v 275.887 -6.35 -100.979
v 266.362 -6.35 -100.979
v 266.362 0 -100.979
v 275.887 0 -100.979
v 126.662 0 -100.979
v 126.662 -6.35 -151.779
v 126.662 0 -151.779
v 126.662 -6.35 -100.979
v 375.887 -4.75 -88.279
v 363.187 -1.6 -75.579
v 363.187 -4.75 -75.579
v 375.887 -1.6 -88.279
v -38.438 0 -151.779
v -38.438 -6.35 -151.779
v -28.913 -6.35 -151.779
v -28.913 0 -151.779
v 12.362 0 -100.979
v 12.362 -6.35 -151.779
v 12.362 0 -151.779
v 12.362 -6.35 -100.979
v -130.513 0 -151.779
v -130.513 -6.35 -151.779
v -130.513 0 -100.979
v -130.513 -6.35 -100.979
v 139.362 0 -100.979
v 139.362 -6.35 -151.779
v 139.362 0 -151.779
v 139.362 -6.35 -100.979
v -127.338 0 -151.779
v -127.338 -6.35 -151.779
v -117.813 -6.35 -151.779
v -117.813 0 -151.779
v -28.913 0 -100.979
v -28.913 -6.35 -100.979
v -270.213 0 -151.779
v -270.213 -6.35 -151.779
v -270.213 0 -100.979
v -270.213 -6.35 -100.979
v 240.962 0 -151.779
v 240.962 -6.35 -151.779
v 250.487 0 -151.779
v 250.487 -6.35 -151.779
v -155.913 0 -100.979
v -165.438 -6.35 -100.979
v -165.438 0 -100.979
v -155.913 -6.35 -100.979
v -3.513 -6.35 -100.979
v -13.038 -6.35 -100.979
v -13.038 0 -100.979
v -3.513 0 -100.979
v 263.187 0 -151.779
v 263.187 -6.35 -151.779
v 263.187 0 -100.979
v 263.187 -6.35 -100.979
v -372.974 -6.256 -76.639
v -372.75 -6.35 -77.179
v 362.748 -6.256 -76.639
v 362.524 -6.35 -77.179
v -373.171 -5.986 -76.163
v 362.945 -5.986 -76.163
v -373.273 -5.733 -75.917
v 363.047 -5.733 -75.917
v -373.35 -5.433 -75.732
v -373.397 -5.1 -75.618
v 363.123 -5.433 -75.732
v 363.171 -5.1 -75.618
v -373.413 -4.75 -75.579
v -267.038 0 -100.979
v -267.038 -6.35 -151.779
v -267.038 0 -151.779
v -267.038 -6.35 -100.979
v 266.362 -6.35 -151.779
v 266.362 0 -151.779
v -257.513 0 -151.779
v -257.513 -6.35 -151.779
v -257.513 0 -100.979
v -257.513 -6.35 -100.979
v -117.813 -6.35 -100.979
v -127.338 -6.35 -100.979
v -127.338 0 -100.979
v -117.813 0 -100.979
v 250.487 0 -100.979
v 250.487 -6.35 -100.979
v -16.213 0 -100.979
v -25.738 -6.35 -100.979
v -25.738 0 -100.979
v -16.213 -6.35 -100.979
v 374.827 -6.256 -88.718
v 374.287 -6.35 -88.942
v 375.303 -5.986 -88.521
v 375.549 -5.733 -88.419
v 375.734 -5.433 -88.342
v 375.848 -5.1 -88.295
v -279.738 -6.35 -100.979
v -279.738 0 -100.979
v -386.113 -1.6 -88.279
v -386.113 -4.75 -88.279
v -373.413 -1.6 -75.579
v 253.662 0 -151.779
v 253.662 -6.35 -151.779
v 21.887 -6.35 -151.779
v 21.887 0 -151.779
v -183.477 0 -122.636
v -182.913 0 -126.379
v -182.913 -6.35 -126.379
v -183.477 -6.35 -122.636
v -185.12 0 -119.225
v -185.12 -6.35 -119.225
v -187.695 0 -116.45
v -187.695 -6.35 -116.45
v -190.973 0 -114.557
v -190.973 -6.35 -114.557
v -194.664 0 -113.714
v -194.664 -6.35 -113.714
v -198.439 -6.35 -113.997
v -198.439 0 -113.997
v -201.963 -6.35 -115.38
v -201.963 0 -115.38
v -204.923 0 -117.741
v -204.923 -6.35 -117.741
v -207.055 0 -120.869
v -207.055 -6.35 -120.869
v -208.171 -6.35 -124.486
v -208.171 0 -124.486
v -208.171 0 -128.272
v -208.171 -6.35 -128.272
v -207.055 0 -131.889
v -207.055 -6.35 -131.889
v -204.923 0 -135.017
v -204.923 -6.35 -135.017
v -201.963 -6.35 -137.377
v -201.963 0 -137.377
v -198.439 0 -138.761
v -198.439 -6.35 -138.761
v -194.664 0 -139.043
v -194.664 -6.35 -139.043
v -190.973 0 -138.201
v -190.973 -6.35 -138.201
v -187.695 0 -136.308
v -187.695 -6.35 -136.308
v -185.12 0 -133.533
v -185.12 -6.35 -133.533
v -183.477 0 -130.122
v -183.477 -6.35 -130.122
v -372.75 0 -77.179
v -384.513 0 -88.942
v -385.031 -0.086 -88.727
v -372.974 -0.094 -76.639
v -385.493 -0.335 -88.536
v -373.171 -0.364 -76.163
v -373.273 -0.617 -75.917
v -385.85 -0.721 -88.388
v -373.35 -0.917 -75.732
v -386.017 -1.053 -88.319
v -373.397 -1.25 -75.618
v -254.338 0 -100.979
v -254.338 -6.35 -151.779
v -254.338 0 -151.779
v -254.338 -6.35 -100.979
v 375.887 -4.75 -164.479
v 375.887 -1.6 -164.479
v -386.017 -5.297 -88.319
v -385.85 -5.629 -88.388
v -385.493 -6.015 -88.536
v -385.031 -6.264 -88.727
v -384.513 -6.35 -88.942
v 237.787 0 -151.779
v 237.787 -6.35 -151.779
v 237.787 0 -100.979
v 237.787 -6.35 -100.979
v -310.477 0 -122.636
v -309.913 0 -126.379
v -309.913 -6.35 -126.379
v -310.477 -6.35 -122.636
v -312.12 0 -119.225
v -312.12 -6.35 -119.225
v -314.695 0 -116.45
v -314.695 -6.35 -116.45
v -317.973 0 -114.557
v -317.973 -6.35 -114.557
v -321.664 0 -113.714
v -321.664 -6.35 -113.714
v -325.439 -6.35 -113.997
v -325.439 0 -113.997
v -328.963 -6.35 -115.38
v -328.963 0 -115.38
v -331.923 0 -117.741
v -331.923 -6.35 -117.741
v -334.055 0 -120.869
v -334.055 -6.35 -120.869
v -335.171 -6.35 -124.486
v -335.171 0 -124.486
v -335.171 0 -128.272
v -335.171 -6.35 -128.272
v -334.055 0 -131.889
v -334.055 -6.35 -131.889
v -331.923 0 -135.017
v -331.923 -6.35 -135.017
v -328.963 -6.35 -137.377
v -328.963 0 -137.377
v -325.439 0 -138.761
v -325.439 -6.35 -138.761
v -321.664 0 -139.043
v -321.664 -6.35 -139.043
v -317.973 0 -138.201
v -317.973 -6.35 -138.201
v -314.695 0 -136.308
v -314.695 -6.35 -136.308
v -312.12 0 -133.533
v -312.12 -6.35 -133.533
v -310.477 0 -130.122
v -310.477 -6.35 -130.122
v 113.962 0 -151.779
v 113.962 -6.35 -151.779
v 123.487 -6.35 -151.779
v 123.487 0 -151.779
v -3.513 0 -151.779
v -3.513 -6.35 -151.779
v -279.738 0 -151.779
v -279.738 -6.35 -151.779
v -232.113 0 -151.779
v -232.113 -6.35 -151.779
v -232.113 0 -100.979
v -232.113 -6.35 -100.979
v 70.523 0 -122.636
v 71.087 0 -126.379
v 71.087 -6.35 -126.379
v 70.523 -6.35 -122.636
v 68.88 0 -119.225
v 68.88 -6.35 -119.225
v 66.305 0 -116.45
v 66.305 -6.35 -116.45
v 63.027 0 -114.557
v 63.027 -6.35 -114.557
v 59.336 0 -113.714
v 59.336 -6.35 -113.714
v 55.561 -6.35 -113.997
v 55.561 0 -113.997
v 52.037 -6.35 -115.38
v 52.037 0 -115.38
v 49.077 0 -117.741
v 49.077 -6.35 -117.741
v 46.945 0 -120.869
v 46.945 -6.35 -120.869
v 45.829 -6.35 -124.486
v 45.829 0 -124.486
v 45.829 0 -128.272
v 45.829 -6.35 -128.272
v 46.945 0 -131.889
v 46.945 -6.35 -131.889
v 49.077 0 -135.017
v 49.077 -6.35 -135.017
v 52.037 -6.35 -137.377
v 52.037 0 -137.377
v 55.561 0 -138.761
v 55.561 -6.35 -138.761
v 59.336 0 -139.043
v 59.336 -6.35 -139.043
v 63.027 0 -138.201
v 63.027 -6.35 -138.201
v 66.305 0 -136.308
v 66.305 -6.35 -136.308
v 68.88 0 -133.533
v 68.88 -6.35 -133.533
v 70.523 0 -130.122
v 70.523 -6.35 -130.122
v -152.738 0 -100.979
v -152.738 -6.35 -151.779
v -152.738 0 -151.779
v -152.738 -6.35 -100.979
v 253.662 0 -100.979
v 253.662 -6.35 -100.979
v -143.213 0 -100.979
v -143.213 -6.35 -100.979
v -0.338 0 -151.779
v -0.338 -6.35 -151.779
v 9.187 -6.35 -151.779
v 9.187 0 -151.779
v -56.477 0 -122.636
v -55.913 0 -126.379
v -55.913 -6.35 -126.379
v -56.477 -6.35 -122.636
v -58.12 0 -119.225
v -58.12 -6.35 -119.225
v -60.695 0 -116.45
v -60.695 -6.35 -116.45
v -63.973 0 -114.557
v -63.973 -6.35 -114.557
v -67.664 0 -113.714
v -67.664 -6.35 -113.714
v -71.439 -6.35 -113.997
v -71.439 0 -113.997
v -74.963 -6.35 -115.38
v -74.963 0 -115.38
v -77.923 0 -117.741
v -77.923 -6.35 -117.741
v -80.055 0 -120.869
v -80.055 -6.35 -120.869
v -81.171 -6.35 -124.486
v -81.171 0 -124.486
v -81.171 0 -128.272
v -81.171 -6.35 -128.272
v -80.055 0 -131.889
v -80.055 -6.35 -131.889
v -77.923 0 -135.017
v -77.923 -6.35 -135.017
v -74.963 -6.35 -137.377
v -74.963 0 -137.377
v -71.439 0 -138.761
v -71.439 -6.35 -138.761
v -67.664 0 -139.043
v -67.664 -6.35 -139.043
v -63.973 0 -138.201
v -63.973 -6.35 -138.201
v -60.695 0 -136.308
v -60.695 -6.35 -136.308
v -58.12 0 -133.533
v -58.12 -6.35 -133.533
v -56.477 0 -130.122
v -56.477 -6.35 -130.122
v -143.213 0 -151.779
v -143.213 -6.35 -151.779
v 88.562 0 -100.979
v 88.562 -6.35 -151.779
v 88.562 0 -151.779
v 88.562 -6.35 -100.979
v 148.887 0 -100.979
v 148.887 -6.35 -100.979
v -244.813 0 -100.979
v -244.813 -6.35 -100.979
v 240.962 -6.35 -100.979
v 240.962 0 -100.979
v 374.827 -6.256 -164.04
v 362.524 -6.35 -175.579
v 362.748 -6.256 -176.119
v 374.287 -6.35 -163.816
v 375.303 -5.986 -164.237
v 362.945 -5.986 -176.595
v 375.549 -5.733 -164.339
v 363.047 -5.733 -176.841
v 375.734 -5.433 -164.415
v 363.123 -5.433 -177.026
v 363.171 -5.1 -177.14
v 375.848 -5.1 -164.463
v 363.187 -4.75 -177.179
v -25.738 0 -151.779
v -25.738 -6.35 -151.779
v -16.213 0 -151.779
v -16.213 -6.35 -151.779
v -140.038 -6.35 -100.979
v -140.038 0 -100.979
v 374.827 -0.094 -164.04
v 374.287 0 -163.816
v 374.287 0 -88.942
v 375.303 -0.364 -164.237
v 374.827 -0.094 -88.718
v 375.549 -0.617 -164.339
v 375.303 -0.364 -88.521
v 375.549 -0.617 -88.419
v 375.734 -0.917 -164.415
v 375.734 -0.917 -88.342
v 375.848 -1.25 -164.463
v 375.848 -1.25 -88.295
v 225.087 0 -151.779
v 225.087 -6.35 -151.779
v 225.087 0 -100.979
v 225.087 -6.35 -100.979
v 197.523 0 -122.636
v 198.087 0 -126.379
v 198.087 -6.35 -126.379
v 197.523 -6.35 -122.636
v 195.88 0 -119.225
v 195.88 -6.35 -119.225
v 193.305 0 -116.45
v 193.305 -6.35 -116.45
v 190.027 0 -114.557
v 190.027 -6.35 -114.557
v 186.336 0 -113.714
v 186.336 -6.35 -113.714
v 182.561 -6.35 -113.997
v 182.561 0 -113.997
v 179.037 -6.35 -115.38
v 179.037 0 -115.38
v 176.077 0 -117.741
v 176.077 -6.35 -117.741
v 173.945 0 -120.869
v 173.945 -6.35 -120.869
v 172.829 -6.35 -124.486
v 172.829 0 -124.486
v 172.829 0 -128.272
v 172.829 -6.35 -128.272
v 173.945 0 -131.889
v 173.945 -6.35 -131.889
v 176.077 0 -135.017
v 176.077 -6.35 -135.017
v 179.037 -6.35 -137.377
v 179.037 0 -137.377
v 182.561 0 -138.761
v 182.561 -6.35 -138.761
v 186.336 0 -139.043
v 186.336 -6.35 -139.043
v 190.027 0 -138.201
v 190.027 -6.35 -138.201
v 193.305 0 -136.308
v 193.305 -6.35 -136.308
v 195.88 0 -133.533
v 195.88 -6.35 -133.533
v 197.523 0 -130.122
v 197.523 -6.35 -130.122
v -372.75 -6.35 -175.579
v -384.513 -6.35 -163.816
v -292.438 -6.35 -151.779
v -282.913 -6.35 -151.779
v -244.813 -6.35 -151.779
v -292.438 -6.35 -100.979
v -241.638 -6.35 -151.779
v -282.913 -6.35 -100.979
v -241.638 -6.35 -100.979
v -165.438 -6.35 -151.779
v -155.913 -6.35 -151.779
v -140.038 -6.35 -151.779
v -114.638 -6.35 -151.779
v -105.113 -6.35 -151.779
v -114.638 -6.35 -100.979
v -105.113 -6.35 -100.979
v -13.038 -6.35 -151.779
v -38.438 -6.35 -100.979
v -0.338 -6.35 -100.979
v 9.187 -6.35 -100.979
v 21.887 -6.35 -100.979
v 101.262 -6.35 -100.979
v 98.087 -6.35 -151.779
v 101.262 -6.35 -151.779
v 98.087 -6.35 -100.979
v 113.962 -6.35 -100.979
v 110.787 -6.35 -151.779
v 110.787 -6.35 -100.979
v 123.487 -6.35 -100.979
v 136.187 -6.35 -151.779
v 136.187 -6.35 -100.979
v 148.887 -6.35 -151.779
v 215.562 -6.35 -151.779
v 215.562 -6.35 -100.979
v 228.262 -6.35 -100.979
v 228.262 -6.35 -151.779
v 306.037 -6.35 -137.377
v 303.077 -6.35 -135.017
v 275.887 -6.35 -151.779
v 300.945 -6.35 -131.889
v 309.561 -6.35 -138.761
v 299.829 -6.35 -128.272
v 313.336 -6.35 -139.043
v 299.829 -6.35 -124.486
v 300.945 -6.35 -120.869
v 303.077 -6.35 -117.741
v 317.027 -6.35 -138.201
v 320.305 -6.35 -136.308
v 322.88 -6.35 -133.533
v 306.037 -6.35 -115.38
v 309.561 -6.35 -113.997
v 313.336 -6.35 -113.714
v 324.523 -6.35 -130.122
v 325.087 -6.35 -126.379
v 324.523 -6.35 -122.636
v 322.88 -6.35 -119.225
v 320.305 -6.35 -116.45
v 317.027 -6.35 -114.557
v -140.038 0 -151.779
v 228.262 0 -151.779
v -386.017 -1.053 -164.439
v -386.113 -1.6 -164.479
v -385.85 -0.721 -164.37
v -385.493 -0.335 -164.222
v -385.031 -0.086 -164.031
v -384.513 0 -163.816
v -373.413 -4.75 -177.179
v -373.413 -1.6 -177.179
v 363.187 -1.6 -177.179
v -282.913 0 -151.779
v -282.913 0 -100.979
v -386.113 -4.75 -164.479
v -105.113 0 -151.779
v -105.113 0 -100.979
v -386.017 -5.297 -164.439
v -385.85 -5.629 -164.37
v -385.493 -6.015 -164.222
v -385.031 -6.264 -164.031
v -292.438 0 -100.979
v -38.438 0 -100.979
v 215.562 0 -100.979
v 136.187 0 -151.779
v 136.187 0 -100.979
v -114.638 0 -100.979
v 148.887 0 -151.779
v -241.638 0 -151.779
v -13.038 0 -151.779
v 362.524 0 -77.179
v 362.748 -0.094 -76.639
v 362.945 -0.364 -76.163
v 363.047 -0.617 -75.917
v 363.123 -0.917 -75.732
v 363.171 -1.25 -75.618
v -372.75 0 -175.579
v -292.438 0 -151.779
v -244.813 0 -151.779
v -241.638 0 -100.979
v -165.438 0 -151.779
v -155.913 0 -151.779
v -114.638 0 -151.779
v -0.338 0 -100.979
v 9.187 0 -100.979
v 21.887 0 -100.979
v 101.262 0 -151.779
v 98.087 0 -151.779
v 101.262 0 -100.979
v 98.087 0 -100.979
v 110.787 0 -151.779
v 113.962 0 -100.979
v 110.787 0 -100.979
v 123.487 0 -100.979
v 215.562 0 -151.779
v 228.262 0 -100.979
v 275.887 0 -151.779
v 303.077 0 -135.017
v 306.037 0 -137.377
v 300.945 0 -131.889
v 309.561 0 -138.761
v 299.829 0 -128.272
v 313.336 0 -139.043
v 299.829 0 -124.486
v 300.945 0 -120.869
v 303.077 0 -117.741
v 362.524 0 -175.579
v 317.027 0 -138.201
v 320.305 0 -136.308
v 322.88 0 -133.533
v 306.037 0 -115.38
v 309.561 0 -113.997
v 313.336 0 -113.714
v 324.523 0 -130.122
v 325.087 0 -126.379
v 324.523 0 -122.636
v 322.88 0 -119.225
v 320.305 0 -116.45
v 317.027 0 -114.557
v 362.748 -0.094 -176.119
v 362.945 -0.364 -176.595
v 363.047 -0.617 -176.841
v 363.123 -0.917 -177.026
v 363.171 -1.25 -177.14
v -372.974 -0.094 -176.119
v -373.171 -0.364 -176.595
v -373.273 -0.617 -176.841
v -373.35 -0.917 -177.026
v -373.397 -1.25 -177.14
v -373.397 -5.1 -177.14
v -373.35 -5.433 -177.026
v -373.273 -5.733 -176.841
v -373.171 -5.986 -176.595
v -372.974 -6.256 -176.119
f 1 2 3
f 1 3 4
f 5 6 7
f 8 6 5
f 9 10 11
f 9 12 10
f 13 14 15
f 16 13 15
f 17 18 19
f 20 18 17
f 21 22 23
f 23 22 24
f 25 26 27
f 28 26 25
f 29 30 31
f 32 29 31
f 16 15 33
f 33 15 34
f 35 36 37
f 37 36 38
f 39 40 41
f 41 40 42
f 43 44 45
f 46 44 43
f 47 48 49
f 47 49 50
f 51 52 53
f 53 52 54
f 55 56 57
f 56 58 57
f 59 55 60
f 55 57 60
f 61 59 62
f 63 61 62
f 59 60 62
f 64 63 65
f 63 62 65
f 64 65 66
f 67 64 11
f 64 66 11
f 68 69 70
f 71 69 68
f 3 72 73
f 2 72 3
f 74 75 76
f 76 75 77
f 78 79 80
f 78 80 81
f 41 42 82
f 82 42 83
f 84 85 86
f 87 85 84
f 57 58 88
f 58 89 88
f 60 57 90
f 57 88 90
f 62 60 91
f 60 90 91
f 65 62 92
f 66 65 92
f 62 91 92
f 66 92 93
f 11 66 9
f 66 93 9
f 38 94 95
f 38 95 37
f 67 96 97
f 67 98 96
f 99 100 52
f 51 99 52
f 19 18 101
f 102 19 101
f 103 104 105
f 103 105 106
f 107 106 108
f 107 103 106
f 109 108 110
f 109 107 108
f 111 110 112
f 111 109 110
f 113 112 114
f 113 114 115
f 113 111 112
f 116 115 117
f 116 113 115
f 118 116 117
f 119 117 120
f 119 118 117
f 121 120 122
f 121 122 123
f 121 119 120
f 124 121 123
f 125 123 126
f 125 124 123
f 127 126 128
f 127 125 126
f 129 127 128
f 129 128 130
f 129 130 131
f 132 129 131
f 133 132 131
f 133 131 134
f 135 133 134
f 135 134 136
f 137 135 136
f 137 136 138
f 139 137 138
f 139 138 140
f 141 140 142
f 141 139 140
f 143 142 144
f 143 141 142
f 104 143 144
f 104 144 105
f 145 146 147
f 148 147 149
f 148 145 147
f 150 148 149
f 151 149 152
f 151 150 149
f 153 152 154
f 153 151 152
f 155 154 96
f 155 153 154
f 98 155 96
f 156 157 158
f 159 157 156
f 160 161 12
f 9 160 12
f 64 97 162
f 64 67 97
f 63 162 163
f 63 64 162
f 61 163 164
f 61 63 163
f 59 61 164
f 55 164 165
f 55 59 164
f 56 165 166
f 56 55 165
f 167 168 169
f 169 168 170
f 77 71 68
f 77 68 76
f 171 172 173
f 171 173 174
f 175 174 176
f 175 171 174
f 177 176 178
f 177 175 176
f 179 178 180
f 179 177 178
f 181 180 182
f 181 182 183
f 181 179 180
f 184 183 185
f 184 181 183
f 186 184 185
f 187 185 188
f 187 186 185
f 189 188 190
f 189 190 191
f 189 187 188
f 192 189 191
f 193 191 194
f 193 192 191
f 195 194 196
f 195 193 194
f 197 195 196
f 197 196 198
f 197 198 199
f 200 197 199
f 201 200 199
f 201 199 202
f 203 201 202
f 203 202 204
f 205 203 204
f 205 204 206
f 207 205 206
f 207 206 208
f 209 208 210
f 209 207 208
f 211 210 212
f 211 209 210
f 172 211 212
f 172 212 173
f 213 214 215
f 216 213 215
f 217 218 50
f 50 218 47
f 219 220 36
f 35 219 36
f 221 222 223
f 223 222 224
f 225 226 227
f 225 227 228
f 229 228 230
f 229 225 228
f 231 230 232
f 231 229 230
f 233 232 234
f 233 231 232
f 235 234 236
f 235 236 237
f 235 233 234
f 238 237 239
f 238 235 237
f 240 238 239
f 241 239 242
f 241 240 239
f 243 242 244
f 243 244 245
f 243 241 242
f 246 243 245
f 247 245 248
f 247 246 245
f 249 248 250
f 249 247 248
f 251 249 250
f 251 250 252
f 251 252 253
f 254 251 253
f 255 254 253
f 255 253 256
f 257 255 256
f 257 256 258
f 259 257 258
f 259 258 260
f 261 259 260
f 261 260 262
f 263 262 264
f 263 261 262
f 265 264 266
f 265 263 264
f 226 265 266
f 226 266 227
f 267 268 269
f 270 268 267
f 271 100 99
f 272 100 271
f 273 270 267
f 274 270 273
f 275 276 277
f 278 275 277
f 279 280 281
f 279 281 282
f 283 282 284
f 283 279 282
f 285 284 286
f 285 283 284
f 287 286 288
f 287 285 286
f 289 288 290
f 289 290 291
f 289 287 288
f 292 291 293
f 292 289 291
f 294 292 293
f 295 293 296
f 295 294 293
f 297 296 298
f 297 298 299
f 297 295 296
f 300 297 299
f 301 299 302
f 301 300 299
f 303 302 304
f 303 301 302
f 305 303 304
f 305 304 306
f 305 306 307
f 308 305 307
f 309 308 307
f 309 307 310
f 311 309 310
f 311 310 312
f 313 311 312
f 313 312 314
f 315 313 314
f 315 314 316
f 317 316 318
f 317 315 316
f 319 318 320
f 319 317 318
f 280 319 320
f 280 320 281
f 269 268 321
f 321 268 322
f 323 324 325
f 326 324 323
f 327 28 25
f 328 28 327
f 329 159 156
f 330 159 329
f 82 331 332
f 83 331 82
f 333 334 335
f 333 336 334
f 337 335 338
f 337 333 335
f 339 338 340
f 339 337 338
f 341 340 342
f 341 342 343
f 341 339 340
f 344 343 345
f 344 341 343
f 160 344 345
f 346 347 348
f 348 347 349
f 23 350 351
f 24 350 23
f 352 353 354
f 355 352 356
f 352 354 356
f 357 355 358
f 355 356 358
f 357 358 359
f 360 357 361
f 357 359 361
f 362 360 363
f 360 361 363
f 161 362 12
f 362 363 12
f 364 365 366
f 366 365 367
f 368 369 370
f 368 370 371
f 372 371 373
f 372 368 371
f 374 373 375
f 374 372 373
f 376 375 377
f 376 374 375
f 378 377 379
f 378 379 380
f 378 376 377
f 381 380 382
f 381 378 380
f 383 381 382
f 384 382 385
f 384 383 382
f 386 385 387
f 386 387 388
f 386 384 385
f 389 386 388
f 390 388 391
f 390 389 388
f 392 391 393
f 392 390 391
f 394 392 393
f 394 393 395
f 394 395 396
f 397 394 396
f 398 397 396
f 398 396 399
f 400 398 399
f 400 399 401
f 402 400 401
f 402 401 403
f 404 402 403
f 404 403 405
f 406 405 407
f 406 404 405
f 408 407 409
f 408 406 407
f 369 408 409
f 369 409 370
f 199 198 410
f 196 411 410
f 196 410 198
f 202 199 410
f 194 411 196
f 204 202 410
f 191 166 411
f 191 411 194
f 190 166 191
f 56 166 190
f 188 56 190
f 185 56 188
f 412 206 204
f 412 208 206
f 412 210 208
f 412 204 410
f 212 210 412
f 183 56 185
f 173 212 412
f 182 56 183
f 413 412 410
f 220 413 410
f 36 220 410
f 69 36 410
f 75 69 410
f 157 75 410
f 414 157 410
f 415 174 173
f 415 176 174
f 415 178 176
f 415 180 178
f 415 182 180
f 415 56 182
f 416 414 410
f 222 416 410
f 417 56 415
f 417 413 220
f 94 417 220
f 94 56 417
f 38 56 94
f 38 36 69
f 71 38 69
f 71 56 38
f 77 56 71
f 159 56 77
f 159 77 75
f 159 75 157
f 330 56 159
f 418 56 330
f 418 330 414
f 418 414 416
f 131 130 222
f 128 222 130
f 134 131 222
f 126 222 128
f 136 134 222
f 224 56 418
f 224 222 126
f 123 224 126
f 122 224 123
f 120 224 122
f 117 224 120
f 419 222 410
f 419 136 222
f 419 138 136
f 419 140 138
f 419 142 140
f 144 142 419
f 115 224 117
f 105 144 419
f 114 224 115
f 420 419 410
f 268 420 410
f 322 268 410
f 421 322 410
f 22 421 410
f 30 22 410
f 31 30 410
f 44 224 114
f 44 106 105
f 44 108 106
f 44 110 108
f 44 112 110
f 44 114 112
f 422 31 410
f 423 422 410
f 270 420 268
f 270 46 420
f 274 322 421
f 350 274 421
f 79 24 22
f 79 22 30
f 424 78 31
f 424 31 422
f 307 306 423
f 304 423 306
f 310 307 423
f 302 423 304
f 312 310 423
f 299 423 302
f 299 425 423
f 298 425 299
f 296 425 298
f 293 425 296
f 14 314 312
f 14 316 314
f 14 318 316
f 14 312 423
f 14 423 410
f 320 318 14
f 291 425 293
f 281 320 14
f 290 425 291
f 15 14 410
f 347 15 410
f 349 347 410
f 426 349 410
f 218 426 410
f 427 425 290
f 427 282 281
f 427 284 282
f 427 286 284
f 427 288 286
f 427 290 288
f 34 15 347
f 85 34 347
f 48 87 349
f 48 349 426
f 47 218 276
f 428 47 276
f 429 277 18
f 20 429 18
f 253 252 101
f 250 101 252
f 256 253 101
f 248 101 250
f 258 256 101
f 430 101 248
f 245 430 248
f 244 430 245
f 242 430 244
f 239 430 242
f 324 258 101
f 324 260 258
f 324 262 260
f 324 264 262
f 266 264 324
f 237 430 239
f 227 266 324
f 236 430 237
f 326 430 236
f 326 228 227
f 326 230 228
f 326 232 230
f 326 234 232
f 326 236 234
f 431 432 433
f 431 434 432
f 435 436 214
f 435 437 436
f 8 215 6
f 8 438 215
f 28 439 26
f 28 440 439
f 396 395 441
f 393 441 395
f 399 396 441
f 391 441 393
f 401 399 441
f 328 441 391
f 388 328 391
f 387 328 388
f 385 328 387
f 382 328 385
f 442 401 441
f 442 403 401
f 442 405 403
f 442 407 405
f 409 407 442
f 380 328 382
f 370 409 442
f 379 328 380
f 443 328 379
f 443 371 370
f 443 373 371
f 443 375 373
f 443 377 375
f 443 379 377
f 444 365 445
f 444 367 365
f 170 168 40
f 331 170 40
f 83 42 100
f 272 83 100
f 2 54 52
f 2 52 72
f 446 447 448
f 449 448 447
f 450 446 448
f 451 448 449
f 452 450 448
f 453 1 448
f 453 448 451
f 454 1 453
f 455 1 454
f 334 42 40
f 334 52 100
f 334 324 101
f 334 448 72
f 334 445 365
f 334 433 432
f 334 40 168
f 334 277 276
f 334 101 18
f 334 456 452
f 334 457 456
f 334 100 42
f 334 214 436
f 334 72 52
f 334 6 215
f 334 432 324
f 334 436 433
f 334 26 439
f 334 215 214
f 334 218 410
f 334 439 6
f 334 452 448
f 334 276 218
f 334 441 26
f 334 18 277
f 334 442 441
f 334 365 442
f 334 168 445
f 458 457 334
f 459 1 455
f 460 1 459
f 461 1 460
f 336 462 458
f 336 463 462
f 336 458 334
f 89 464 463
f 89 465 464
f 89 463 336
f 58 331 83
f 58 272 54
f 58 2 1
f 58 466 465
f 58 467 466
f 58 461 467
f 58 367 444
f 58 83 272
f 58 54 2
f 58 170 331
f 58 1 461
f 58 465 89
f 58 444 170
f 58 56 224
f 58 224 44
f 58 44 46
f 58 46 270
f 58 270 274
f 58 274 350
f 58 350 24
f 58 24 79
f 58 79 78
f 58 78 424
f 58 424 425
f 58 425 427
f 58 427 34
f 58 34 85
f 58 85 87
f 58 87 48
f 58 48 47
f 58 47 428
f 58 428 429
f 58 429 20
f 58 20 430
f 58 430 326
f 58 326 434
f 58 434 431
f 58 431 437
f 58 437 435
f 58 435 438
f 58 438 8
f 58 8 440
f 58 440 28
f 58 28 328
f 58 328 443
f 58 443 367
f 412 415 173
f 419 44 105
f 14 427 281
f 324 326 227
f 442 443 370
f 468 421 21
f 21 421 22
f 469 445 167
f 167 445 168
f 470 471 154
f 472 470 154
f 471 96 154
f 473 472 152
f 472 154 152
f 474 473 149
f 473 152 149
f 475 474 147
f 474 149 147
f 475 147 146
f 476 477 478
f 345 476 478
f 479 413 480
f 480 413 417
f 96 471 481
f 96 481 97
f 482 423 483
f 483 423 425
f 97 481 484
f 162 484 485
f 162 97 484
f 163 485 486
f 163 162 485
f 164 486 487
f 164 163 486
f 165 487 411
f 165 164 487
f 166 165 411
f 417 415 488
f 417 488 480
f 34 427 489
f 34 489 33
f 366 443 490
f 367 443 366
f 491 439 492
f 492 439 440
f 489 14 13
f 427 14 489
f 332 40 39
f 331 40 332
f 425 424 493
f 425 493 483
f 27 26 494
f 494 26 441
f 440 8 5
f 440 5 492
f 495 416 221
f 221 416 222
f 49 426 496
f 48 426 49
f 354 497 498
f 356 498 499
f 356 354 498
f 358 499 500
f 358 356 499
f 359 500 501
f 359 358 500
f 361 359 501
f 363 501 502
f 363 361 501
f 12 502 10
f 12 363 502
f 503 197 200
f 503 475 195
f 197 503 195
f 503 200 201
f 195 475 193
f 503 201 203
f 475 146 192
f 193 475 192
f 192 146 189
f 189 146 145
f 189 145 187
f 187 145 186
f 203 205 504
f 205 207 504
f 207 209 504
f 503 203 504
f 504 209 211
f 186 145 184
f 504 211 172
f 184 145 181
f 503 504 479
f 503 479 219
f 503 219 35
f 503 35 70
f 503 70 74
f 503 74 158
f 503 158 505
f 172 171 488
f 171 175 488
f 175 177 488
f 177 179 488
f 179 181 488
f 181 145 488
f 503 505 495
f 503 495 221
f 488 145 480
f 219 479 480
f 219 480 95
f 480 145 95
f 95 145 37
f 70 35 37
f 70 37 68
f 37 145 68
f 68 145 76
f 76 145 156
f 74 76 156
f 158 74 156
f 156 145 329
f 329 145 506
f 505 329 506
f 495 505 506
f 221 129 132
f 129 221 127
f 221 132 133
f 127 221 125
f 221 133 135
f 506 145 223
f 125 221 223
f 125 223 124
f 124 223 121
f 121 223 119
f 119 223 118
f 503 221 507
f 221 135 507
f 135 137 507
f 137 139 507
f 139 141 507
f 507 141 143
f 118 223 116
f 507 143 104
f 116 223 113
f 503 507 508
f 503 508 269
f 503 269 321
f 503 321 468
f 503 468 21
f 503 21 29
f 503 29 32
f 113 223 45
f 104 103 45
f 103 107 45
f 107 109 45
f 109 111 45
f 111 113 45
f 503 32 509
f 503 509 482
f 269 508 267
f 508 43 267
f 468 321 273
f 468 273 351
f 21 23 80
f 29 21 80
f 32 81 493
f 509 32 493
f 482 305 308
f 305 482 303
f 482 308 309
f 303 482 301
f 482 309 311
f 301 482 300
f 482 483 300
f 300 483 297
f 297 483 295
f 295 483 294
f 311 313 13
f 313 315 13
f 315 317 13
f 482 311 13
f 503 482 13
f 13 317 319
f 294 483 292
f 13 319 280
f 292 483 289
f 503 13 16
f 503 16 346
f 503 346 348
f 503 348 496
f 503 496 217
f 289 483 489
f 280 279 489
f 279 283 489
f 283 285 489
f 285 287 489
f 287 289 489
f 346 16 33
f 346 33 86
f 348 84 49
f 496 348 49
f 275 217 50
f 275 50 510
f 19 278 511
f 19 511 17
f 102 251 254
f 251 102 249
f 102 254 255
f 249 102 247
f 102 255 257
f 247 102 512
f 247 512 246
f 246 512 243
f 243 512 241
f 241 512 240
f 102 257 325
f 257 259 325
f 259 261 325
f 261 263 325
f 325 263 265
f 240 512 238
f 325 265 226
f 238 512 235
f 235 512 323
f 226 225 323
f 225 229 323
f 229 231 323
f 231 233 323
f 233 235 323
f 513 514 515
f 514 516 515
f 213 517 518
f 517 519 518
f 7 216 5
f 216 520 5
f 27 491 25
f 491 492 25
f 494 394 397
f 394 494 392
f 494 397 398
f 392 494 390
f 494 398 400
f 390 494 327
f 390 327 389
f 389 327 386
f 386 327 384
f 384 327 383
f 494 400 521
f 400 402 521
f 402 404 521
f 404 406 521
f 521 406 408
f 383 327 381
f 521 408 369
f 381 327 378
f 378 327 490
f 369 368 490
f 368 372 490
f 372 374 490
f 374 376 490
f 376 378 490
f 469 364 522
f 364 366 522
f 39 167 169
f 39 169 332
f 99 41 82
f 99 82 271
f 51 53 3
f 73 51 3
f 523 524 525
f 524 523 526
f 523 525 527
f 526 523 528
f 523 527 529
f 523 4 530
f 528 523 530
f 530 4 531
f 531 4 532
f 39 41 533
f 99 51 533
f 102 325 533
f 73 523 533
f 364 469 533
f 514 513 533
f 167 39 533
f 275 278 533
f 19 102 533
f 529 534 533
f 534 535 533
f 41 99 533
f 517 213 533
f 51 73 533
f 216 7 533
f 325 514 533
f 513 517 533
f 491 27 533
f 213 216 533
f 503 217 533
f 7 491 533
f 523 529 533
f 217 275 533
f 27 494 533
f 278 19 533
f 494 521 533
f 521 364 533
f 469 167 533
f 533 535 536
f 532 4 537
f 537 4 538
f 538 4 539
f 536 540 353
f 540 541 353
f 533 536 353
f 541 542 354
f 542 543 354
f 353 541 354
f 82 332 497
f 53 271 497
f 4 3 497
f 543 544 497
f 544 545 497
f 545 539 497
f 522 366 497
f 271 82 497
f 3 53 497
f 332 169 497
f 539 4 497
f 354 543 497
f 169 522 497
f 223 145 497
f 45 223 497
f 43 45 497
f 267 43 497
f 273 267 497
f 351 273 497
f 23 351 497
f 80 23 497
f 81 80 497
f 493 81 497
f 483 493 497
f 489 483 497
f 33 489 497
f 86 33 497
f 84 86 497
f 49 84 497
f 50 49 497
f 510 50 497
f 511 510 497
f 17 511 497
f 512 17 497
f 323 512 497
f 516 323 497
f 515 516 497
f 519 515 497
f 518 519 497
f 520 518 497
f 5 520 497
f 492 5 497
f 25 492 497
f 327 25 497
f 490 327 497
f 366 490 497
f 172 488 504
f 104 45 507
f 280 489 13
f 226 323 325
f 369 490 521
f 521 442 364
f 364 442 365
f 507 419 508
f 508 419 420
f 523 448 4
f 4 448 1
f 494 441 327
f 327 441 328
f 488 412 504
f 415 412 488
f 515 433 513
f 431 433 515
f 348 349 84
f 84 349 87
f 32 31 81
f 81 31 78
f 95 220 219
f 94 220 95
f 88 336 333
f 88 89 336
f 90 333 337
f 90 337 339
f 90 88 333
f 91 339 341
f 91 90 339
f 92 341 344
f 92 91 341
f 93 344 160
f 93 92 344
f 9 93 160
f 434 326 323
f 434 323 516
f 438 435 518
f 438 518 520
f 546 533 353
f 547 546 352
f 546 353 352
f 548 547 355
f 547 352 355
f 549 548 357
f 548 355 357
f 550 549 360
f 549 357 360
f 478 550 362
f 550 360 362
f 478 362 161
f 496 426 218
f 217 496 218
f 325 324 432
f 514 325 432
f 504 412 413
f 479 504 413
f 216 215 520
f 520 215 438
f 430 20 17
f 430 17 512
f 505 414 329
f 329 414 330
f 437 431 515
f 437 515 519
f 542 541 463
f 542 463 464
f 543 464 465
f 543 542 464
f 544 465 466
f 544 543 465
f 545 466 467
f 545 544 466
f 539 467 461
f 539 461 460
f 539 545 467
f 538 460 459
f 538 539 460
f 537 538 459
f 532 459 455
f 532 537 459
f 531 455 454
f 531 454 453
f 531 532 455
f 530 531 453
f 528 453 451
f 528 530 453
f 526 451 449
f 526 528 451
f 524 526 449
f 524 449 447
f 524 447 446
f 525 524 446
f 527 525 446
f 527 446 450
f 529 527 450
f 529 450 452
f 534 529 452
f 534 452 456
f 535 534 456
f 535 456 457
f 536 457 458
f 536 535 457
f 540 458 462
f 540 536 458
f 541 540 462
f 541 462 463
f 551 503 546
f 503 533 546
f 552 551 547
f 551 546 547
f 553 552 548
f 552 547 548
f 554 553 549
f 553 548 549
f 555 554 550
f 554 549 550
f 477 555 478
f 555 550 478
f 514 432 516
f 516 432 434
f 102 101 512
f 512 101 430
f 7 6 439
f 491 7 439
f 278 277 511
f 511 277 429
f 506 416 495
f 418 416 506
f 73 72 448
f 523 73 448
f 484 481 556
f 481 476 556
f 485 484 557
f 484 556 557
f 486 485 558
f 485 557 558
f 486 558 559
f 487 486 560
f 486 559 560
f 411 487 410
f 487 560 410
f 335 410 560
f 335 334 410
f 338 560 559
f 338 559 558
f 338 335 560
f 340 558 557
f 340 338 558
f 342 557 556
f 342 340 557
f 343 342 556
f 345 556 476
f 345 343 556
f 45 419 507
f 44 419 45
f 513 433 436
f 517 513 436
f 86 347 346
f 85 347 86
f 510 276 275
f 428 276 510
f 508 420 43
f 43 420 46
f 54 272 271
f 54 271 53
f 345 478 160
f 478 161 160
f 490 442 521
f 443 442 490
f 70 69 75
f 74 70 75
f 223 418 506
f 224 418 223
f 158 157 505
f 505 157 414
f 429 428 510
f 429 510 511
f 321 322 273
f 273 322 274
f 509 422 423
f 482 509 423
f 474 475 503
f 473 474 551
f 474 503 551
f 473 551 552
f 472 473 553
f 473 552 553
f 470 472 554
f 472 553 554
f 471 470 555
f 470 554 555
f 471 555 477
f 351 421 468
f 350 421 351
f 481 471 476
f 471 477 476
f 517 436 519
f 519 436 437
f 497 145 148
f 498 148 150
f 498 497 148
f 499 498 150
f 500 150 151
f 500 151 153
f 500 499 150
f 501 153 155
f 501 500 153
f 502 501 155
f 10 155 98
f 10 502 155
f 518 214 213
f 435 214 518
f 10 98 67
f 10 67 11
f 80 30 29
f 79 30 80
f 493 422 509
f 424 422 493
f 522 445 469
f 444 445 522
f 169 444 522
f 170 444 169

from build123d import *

# Parameters (mm, degrees)
F0_W     = 762
F0_H     = 101.6
F0_R     = 12.7
F1_DEPTH = 6.35
F2_W     = 9.525
F2_H     = 50.8
F3_DEPTH = 6.351
F4_SIZE  = 12.7
F5_R     = 1.6002


with BuildPart() as f1:
    # F0 (on Front) → F1 (new body)
    with BuildSketch(Plane.XZ):
        with Locations((-5.1130652428, -126.3789658944)):
            Rectangle(F0_W, F0_H)
        with Locations((-322.6130652428, -126.3789658944)):
            Circle(F0_R, mode=Mode.SUBTRACT)
        with Locations((-195.6130652428, -126.3789658944)):
            Circle(F0_R, mode=Mode.SUBTRACT)
        with Locations((-68.6130652428, -126.3789658944)):
            Circle(F0_R, mode=Mode.SUBTRACT)
        with Locations((58.3869347572, -126.3789658944)):
            Circle(F0_R, mode=Mode.SUBTRACT)
        with Locations((185.3869347572, -126.3789658944)):
            Circle(F0_R, mode=Mode.SUBTRACT)
        with Locations((312.3869347572, -126.3789658944)):
            Circle(F0_R, mode=Mode.SUBTRACT)
    extrude(amount=F1_DEPTH)

    # F2 (on face) → F3 (cut, through all)
    with BuildSketch(Plane.XZ.offset(6.35)):
        with Locations((-287.6753652428, -126.3789658944)):
            Rectangle(F2_W, F2_H)
        with Locations((-274.9753652428, -126.3789658944)):
            Rectangle(F2_W, F2_H)
        with Locations((-262.2753652428, -126.3789658944)):
            Rectangle(F2_W, F2_H)
        with Locations((-249.5753652428, -126.3789658944)):
            Rectangle(F2_W, F2_H)
        with Locations((-236.8753652428, -126.3789658944)):
            Rectangle(F2_W, F2_H)
        with Locations((-160.6753652428, -126.3789658944)):
            Rectangle(F2_W, F2_H)
        with Locations((-147.9753652428, -126.3789658944)):
            Rectangle(F2_W, F2_H)
        with Locations((-135.2753652428, -126.3789658944)):
            Rectangle(F2_W, F2_H)
        with Locations((-122.5753652428, -126.3789658944)):
            Rectangle(F2_W, F2_H)
        with Locations((-109.8753652428, -126.3789658944)):
            Rectangle(F2_W, F2_H)
        with Locations((-33.6753652428, -126.3789658944)):
            Rectangle(F2_W, F2_H)
        with Locations((-20.9753652428, -126.3789658944)):
            Rectangle(F2_W, F2_H)
        with Locations((-8.2753652428, -126.3789658944)):
            Rectangle(F2_W, F2_H)
        with Locations((4.4246347572, -126.3789658944)):
            Rectangle(F2_W, F2_H)
        with Locations((17.1246347572, -126.3789658944)):
            Rectangle(F2_W, F2_H)
        with Locations((93.3246347572, -126.3789658944)):
            Rectangle(F2_W, F2_H)
        with Locations((106.0246347572, -126.3789658944)):
            Rectangle(F2_W, F2_H)
        with Locations((118.7246347572, -126.3789658944)):
            Rectangle(F2_W, F2_H)
        with Locations((131.4246347572, -126.3789658944)):
            Rectangle(F2_W, F2_H)
        with Locations((144.1246347572, -126.3789658944)):
            Rectangle(F2_W, F2_H)
        with Locations((220.3246347572, -126.3789658944)):
            Rectangle(F2_W, F2_H)
        with Locations((233.0246347572, -126.3789658944)):
            Rectangle(F2_W, F2_H)
        with Locations((245.7246347572, -126.3789658944)):
            Rectangle(F2_W, F2_H)
        with Locations((258.4246347572, -126.3789658944)):
            Rectangle(F2_W, F2_H)
        with Locations((271.1246347572, -126.3789658944)):
            Rectangle(F2_W, F2_H)
    extrude(amount=-F3_DEPTH, mode=Mode.SUBTRACT)

    # F4
    f4_edges = [f1.edges().sort_by_distance(p)[0] for p in [
        (-386.113065, -3.175, -75.578966),
        (-386.113065, -3.175, -177.178966),
        (375.886935, -3.175, -75.578966),
        (375.886935, -3.175, -177.178966),
    ]]
    chamfer(f4_edges, length=F4_SIZE)

    # F5
    f5_edges = [f1.edges().sort_by_distance(p)[0] for p in [
        (-5.113065, -6.35, -177.178966),
        (-5.113065, 0, -177.178966),
        (369.536935, -6.35, -170.828966),
        (375.886935, -6.35, -126.378966),
        (369.536935, 0, -170.828966),
        (375.886935, 0, -126.378966),
        (369.536935, -6.35, -81.928966),
        (369.536935, 0, -81.928966),
        (-5.113065, -6.35, -75.578966),
        (-5.113065, 0, -75.578966),
        (-386.113065, -6.35, -126.378966),
        (-386.113065, 0, -126.378966),
        (-379.763065, -6.35, -170.828966),
        (-379.763065, 0, -170.828966),
        (-379.763065, -6.35, -81.928966),
        (-379.763065, 0, -81.928966),
    ]]
    fillet(f5_edges, radius=F5_R)


solid = f1.part
